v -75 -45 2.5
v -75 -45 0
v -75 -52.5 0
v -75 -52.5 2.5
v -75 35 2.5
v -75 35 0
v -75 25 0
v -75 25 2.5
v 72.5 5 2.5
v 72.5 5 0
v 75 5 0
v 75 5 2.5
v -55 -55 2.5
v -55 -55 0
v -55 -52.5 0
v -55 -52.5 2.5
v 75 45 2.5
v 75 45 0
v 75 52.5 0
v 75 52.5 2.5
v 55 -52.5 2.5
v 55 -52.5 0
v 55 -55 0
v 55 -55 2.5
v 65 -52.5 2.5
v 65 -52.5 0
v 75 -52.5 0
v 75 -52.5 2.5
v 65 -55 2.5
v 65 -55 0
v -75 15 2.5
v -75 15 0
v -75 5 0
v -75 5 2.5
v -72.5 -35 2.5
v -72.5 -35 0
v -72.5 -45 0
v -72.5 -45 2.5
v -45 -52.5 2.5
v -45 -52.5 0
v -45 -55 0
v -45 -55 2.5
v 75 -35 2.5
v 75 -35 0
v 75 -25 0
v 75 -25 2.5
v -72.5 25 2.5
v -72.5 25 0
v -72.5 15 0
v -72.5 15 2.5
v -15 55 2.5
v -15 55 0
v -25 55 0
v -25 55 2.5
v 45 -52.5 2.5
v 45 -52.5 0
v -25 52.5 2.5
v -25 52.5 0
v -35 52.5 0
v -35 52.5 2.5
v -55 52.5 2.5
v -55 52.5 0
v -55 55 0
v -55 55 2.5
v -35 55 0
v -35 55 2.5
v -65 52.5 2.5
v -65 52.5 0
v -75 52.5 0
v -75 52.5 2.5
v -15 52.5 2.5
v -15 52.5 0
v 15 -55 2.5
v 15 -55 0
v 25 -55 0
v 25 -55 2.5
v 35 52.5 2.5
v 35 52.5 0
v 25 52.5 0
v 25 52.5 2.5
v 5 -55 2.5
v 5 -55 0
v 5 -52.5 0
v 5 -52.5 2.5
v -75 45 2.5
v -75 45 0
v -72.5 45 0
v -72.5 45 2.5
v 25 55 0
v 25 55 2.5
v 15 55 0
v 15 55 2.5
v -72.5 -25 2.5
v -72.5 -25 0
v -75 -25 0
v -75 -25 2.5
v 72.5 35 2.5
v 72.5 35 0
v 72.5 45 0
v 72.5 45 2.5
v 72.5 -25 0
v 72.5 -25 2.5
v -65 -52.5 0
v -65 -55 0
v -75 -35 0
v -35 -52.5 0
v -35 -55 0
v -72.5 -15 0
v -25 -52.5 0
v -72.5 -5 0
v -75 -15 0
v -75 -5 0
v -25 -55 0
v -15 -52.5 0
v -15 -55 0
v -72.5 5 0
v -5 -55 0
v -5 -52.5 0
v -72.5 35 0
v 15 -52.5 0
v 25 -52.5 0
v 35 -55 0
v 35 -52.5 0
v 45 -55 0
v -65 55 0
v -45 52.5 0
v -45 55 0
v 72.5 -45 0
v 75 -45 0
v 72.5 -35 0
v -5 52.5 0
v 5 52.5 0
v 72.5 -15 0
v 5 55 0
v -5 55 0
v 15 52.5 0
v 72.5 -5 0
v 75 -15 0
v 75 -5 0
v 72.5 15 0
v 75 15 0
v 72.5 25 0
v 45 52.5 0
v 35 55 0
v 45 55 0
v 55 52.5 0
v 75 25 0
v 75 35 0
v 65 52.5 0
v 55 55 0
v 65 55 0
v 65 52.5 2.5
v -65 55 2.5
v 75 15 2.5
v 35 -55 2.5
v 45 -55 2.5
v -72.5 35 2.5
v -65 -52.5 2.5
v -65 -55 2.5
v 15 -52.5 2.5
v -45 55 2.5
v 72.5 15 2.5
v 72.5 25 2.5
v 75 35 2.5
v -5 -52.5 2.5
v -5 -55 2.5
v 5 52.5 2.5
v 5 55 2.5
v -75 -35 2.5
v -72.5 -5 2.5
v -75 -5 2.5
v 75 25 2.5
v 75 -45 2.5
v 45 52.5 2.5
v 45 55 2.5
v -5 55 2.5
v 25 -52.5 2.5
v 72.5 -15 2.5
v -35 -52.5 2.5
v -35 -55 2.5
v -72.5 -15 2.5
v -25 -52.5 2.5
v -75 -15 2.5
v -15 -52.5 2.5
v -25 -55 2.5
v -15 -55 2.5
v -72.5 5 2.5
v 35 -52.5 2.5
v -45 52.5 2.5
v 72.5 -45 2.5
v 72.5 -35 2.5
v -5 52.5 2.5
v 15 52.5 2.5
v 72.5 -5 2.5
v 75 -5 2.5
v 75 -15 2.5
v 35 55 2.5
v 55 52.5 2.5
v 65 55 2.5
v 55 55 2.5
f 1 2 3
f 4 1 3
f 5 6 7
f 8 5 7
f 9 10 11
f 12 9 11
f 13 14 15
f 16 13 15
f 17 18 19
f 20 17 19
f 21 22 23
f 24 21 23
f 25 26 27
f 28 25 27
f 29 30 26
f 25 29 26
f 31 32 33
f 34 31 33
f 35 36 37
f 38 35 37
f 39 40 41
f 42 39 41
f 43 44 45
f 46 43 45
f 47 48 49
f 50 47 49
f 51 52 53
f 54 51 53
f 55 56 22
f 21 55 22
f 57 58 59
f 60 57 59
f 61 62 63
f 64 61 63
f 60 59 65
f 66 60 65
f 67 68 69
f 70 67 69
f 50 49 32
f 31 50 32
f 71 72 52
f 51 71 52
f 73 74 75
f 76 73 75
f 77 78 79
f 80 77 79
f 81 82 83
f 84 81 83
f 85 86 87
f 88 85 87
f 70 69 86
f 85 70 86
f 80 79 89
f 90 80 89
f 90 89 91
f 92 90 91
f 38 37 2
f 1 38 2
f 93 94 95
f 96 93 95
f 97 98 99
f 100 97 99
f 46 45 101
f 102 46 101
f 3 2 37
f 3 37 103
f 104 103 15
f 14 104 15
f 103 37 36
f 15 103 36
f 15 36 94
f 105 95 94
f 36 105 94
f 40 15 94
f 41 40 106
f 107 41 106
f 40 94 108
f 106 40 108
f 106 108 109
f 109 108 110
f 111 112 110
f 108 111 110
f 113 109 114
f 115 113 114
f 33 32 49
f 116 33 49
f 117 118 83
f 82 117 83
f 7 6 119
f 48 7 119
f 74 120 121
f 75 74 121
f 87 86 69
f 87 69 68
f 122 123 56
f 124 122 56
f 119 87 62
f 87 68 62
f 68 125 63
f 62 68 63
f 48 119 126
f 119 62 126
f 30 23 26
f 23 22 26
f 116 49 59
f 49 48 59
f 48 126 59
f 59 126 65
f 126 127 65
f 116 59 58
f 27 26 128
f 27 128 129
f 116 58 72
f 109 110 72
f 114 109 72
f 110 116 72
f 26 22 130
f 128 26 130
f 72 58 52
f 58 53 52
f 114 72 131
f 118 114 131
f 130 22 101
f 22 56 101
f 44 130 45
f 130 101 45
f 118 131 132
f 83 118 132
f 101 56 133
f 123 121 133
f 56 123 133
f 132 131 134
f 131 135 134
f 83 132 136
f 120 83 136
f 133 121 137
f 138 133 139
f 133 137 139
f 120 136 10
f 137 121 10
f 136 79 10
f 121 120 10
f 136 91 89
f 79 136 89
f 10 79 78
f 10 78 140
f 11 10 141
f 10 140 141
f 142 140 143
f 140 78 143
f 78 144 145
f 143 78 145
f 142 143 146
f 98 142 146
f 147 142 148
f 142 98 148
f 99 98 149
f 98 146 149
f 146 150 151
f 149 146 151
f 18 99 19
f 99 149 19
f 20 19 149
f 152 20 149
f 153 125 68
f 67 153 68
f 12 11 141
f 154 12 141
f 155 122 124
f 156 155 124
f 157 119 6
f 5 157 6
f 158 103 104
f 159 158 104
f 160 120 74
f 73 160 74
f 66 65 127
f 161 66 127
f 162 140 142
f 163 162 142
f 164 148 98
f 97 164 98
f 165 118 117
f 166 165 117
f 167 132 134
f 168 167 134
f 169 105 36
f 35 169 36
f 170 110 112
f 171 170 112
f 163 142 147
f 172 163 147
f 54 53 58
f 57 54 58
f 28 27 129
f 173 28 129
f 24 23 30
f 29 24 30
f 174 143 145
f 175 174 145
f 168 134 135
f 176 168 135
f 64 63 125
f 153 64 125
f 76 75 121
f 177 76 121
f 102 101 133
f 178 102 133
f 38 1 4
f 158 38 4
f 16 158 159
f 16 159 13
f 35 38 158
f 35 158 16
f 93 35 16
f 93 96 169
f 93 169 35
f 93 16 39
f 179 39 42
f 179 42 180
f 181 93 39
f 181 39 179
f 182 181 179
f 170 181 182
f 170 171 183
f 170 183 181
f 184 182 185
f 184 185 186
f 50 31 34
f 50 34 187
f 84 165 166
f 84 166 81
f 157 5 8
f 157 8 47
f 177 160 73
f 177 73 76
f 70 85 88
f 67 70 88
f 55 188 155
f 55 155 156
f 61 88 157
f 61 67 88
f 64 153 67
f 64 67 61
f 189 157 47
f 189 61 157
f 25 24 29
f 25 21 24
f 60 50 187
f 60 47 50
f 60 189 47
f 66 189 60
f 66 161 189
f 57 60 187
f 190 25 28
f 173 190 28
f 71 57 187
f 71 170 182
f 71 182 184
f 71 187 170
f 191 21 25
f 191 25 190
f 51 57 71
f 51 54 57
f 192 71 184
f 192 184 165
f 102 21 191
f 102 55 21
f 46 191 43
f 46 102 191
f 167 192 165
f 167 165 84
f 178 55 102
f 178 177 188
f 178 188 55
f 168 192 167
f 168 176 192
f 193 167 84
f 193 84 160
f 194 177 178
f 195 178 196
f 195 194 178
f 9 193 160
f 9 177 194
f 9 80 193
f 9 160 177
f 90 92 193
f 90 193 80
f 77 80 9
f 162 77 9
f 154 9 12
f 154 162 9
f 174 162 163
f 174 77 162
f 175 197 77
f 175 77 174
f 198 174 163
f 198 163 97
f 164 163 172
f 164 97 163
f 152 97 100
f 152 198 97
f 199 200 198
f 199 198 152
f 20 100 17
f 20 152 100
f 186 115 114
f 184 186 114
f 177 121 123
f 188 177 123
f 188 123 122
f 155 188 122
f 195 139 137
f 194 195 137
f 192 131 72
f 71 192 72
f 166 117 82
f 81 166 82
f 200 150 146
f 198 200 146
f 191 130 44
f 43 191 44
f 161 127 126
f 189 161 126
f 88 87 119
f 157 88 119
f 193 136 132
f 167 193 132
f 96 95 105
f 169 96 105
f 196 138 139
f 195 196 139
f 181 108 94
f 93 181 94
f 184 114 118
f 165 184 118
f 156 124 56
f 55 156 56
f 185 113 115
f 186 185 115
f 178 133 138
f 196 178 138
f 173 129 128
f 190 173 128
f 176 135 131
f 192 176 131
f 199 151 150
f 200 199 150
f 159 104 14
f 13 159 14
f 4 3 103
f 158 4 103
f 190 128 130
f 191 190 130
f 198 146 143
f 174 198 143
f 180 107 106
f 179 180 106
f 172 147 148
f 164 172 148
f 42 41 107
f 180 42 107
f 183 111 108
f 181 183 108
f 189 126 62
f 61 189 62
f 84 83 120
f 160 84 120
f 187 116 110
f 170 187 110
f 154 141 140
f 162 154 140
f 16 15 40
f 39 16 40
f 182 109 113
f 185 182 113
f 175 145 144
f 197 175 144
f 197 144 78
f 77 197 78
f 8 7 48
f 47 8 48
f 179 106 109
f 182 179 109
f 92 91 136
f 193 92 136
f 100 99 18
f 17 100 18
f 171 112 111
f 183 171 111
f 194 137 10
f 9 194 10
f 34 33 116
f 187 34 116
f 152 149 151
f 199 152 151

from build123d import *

# Parameters (mm, degrees)
F1_DEPTH = 2.5


with BuildPart() as f1:
    # F0 (on Top) → F1 (new body)
    with BuildSketch(Plane.XY):
        Polygon((55, -55), (65, -55), (65, -52.5), (75, -52.5), (75, -45), (72.5, -45), (72.5, -35), (75, -35), (75, -25), (72.5, -25), (72.5, -15), (75, -15), (75, -5), (72.5, -5), (72.5, 5), (75, 5), (75, 15), (72.5, 15), (72.5, 25), (75, 25), (75, 35), (72.5, 35), (72.5, 45), (75, 45), (75, 52.5), (65, 52.5), (65, 55), (55, 55), (55, 52.5), (45, 52.5), (45, 55), (35, 55), (35, 52.5), (25, 52.5), (25, 55), (15, 55), (15, 52.5), (5, 52.5), (5, 55), (-5, 55), (-5, 52.5), (-15, 52.5), (-15, 55), (-25, 55), (-25, 52.5), (-35, 52.5), (-35, 55), (-45, 55), (-45, 52.5), (-55, 52.5), (-55, 55), (-65, 55), (-65, 52.5), (-75, 52.5), (-75, 45), (-72.5, 45), (-72.5, 35), (-75, 35), (-75, 25), (-72.5, 25), (-72.5, 15), (-75, 15), (-75, 5), (-72.5, 5), (-72.5, -5), (-75, -5), (-75, -15), (-72.5, -15), (-72.5, -25), (-75, -25), (-75, -35), (-72.5, -35), (-72.5, -45), (-75, -45), (-75, -52.5), (-65, -52.5), (-65, -55), (-55, -55), (-55, -52.5), (-45, -52.5), (-45, -55), (-35, -55), (-35, -52.5), (-25, -52.5), (-25, -55), (-15, -55), (-15, -52.5), (-5, -52.5), (-5, -55), (5, -55), (5, -52.5), (15, -52.5), (15, -55), (25, -55), (25, -52.5), (35, -52.5), (35, -55), (45, -55), (45, -52.5), (55, -52.5), align=None)
    extrude(amount=F1_DEPTH)


solid = f1.part
